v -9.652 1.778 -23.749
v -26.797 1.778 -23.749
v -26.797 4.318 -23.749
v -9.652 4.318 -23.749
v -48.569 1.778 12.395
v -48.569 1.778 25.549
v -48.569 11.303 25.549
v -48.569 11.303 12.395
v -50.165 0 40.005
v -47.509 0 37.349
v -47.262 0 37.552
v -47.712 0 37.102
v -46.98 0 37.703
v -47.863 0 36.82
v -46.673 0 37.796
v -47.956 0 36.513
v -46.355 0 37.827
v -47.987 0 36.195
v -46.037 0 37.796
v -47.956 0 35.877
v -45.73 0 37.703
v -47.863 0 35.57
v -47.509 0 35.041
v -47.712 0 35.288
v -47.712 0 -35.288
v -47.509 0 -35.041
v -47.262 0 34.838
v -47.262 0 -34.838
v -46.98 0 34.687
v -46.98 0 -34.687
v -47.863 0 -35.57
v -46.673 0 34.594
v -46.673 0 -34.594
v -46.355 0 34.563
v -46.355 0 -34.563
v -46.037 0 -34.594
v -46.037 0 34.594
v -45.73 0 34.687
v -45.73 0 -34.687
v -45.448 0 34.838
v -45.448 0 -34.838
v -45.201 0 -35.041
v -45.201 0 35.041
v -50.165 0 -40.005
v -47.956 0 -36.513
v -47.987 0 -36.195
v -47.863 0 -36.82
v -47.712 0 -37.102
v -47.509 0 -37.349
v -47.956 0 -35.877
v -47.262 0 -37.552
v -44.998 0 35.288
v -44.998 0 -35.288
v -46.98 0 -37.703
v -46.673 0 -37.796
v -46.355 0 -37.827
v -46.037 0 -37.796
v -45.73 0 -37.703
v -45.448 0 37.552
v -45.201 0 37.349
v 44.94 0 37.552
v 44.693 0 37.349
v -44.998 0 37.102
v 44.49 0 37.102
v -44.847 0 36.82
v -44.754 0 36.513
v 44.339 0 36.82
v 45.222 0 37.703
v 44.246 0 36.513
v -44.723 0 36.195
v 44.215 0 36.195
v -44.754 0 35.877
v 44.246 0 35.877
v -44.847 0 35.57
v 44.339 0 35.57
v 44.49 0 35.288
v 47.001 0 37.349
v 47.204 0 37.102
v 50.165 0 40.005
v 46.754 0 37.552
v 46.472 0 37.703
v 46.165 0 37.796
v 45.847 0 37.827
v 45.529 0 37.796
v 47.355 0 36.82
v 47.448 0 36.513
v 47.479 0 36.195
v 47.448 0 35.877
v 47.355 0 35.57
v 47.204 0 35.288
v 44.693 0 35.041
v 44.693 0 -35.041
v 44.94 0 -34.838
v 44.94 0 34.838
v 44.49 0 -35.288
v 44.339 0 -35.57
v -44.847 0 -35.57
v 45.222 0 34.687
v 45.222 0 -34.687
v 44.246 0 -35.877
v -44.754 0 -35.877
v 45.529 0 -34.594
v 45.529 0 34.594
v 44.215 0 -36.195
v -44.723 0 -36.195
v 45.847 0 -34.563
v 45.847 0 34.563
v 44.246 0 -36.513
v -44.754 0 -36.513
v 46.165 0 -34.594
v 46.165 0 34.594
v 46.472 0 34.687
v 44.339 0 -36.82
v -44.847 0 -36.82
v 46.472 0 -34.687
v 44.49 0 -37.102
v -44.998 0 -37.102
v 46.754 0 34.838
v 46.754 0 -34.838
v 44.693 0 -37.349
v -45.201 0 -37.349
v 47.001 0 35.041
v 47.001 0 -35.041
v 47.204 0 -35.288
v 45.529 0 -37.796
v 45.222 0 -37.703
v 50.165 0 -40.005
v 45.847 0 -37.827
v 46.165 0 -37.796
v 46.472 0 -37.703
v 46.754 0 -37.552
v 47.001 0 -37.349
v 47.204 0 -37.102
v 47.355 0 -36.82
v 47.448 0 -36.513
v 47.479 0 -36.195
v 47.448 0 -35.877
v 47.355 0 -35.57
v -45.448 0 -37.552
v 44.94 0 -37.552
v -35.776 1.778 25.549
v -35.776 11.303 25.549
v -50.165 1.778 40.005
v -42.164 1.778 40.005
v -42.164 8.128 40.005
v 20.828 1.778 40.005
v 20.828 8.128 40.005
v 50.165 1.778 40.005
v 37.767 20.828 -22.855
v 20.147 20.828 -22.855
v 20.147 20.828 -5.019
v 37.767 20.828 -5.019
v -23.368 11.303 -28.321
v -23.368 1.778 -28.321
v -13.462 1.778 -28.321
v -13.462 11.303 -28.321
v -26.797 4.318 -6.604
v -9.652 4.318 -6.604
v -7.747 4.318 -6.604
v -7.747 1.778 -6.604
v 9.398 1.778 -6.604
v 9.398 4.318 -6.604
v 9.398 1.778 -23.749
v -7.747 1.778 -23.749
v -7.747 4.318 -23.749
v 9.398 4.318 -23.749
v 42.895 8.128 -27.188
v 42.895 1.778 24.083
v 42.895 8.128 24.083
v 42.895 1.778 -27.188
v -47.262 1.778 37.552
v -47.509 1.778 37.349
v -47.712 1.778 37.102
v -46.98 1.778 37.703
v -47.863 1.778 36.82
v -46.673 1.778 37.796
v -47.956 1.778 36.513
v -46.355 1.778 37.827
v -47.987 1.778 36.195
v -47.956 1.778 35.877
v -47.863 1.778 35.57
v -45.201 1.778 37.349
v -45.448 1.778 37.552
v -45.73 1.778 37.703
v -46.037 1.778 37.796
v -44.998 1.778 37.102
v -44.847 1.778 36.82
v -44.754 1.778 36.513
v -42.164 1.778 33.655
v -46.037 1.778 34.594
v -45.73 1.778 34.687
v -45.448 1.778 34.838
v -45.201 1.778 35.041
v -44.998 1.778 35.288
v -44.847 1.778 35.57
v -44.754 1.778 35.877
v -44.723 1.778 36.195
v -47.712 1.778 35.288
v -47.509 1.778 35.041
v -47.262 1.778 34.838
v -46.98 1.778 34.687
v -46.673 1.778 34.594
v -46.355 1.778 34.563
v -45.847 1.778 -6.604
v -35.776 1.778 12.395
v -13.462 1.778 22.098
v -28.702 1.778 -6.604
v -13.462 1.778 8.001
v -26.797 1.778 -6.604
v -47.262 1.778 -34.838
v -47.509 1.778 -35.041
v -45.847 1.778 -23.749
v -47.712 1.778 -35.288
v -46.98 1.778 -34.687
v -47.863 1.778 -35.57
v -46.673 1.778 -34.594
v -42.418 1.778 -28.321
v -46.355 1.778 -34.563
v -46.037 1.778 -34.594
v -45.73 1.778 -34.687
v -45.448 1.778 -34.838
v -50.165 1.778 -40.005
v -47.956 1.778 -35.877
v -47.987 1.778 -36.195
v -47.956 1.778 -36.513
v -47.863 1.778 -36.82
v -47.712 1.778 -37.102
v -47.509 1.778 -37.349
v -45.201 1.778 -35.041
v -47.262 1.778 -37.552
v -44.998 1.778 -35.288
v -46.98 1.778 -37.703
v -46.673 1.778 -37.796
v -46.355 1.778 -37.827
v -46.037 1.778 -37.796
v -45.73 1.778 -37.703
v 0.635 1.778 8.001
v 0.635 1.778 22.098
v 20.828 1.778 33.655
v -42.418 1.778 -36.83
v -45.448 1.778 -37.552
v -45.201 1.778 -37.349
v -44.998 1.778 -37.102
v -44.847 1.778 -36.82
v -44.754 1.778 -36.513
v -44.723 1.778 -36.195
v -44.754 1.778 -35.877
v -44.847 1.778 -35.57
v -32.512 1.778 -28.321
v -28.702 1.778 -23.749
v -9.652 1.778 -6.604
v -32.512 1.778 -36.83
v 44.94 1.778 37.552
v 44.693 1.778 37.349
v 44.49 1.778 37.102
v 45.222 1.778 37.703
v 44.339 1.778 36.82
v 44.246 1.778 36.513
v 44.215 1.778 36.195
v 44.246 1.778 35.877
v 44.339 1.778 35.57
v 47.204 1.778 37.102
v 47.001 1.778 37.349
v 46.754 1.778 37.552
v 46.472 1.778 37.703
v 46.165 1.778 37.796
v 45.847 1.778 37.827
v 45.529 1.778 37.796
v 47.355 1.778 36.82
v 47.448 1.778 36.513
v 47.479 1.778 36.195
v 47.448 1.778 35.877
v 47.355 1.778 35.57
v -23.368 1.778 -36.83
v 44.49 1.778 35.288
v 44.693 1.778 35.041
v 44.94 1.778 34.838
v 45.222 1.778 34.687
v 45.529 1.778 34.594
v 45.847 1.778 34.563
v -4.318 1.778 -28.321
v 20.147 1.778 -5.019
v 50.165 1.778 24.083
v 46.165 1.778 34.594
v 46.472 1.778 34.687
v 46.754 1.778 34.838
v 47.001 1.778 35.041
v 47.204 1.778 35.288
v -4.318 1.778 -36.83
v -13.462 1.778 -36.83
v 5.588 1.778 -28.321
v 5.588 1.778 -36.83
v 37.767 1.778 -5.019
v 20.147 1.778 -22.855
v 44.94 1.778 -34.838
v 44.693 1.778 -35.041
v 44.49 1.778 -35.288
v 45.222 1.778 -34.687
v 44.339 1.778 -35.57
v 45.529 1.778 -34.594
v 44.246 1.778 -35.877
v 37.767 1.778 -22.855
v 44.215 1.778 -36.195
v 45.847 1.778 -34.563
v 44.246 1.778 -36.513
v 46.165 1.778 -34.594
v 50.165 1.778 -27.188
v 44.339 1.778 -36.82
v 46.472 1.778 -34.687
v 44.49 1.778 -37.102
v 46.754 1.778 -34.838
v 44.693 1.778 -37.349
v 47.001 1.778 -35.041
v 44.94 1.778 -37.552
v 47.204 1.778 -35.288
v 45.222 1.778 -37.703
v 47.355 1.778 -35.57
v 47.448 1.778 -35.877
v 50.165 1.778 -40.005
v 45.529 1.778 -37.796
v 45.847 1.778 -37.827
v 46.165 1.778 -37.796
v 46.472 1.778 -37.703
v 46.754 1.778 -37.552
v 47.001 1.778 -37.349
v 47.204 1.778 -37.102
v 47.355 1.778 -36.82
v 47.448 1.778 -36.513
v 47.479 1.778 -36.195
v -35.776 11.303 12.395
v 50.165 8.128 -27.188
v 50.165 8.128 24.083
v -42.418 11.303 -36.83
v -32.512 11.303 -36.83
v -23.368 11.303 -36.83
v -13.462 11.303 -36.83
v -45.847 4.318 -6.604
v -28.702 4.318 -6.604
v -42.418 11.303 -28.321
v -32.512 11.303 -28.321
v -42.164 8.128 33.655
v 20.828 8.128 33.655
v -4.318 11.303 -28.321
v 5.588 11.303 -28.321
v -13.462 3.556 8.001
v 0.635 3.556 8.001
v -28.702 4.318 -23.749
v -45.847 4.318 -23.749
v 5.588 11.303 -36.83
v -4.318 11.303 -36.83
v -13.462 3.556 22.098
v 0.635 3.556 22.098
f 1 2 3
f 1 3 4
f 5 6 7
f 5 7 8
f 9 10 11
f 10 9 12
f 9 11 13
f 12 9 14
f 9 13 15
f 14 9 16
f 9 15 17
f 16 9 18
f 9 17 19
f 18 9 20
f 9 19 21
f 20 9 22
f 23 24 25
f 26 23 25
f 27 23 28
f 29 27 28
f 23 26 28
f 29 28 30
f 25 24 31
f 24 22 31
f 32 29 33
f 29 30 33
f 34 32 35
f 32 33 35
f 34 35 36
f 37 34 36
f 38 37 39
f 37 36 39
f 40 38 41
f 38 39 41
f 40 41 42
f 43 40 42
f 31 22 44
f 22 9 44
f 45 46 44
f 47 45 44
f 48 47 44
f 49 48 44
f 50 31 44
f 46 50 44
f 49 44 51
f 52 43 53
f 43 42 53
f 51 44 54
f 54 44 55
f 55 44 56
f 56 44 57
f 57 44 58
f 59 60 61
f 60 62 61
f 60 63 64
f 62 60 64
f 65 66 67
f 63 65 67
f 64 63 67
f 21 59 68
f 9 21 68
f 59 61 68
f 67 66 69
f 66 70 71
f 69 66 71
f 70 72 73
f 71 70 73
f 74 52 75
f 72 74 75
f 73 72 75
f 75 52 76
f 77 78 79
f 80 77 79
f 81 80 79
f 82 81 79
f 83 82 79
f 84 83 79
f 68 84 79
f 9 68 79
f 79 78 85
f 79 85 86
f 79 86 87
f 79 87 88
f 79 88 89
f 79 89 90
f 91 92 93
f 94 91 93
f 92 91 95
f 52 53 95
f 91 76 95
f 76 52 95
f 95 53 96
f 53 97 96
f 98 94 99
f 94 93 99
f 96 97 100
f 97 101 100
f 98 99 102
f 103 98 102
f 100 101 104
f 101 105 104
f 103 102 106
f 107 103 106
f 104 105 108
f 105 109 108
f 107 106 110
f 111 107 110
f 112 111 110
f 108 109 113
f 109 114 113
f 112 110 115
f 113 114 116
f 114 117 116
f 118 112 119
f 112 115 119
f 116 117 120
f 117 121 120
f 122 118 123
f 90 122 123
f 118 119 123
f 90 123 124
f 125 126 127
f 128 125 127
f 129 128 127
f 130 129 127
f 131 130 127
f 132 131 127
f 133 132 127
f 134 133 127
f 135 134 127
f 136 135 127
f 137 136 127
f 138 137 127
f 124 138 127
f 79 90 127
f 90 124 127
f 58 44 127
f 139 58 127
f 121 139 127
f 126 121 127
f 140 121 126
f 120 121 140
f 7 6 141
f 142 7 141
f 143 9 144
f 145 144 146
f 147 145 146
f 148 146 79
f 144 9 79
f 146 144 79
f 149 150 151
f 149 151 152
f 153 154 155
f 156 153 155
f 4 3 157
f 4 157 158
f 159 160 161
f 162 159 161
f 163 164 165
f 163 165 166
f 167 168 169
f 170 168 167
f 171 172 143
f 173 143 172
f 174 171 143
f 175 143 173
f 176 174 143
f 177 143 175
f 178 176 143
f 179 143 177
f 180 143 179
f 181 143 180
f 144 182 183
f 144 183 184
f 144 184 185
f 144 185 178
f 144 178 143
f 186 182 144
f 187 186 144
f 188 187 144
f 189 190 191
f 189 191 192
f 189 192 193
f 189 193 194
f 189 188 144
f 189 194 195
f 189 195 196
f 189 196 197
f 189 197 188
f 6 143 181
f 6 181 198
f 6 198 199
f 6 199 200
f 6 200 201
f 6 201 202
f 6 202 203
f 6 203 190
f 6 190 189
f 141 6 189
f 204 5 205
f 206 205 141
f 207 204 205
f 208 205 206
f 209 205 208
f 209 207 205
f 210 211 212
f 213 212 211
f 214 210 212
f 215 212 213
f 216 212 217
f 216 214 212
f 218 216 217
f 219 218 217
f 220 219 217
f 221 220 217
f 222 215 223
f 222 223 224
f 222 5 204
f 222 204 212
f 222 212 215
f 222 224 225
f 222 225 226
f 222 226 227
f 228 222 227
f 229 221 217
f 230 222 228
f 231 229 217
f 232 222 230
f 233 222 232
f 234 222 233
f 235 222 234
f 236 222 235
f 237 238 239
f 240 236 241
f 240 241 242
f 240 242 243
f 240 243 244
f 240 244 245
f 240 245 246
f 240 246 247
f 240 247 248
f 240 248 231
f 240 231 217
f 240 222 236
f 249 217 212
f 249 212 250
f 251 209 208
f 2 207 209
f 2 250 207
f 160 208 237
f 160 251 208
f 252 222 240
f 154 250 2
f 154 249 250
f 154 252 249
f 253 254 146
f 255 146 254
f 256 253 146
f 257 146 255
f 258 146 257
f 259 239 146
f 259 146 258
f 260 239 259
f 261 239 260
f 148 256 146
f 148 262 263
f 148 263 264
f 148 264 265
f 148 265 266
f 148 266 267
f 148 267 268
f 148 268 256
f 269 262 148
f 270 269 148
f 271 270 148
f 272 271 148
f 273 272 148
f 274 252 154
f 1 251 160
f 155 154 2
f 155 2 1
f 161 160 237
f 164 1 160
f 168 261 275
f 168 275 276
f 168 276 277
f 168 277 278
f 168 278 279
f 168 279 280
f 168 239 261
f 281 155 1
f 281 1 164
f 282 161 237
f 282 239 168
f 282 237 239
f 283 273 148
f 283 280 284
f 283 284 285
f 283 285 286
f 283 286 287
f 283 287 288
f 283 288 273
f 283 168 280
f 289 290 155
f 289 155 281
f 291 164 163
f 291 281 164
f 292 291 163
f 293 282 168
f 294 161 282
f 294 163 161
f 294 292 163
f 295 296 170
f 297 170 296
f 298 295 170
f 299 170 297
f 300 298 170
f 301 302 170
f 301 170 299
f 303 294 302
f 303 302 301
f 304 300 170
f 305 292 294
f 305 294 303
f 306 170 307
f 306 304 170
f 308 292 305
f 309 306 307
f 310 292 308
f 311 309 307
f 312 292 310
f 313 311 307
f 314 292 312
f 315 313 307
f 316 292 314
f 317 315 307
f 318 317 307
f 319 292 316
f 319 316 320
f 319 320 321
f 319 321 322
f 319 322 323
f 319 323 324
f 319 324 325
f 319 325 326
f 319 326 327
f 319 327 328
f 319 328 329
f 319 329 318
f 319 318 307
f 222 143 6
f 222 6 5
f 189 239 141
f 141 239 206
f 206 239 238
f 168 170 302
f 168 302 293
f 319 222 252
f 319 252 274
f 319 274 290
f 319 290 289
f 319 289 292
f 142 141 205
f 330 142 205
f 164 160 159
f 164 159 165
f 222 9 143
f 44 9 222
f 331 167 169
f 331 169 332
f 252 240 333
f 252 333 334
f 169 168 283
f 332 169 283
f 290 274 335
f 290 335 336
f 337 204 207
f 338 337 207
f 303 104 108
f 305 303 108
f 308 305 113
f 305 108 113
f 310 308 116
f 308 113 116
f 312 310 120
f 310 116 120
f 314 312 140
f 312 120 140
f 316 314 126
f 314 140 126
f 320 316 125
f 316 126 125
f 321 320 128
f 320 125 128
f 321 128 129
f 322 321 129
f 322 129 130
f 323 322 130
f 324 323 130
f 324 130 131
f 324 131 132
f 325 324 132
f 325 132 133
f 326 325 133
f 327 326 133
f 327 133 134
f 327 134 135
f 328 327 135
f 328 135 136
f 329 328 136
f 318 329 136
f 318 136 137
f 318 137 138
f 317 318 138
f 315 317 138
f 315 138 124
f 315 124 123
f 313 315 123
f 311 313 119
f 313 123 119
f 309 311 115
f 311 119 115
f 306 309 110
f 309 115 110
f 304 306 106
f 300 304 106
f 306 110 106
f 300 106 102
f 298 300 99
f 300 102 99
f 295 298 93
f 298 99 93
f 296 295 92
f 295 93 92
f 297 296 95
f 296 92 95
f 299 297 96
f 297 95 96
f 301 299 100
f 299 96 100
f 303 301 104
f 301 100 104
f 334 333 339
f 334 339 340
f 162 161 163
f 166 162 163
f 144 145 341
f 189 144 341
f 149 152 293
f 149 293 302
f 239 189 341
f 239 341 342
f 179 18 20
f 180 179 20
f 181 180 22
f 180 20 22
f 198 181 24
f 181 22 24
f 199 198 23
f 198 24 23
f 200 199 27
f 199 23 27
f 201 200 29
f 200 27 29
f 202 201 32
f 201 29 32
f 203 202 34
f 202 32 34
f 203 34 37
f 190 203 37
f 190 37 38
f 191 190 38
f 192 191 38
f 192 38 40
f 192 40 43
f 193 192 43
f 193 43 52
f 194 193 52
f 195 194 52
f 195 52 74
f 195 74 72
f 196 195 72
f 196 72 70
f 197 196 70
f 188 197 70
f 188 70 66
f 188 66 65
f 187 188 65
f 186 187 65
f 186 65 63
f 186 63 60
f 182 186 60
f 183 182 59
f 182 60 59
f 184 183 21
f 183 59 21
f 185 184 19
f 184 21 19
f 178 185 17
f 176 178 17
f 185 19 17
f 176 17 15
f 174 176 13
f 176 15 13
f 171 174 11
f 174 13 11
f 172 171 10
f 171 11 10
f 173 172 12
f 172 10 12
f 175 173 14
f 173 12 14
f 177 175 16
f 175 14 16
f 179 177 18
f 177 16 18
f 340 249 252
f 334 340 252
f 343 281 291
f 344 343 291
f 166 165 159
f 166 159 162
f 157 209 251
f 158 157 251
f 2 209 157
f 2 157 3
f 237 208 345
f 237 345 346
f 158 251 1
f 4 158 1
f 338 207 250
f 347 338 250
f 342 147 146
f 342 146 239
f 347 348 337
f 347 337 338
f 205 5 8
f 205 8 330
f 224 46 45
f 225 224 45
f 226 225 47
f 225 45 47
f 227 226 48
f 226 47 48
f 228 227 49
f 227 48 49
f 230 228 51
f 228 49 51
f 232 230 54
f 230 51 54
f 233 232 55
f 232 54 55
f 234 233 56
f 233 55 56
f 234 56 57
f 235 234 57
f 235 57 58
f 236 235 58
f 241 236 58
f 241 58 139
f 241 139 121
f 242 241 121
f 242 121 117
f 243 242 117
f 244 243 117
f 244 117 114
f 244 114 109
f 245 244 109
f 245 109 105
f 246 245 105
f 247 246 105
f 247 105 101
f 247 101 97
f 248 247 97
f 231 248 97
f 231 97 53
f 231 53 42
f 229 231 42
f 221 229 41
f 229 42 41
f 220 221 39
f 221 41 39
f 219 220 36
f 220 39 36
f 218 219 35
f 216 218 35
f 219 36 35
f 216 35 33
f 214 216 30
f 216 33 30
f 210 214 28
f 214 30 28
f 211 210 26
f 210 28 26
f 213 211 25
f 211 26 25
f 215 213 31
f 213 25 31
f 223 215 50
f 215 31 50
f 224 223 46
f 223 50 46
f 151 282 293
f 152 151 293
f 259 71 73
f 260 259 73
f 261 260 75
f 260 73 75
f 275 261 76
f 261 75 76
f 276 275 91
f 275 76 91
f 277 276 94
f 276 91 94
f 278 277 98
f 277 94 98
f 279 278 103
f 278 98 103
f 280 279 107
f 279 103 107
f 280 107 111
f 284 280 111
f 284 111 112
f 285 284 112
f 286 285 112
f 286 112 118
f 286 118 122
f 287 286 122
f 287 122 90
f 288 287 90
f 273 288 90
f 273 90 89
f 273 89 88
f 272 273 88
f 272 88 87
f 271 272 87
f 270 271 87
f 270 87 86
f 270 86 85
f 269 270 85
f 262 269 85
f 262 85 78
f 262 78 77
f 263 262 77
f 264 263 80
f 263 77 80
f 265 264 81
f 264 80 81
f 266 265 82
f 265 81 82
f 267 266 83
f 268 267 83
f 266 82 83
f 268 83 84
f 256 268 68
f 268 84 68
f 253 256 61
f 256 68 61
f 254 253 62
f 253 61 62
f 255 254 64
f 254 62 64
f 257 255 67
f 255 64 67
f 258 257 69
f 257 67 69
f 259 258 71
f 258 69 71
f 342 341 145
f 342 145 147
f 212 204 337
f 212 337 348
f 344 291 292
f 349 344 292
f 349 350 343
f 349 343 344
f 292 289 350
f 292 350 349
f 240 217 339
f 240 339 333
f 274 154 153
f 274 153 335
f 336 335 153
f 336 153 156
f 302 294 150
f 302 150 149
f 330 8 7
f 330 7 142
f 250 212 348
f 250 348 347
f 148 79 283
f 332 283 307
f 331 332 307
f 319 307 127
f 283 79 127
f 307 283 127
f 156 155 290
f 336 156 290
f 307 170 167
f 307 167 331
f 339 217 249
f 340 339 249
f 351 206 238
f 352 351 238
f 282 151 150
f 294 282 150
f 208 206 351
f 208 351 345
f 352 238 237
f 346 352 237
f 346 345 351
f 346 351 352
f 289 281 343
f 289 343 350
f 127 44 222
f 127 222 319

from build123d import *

# Parameters (mm, degrees)
SKETCH1_W                 = 100.33
SKETCH1_H                 = 80.01
BOSS_EXTRUDE1_DEPTH       = 1.778
F_4_CLEARANCE_HOLE1_D     = 3.2639
F_4_CLEARANCE_HOLE1_DEPTH = 12.7
F_4_CLEARANCE_HOLE1_TIP   = 0.980574487
SKETCH4_W                 = 17.145
SKETCH4_H                 = 17.145
BOSS_EXTRUDE2_DEPTH       = 2.54
SKETCH6_W                 = 9.906
SKETCH6_H                 = 8.509
BOSS_EXTRUDE3_DEPTH       = 9.525
LPATTERN1_COUNT           = 3
LPATTERN1_PITCH           = 19.05
SKETCH7_W                 = 14.097
SKETCH7_H                 = 14.097
BOSS_EXTRUDE4_DEPTH       = 1.778
SKETCH8_W                 = 62.992
SKETCH8_H                 = 6.35
BOSS_EXTRUDE5_DEPTH       = 6.35
SKETCH9_W                 = 7.270390316
SKETCH9_H                 = 51.271334807
BOSS_EXTRUDE6_DEPTH       = 6.35
SKETCH10_W                = 17.620008018
SKETCH10_H                = 17.836647461
BOSS_EXTRUDE7_DEPTH       = 19.05
SKETCH11_W                = 12.792637694
SKETCH11_H                = 13.15401164
BOSS_EXTRUDE8_DEPTH       = 9.525


with BuildPart() as part:
    # Sketch1 → Boss-Extrude1 (new body)
    with BuildSketch(Plane(origin=(0, 0, 0), x_dir=(1, 0, 0), z_dir=(0, 1, 0))):
        Rectangle(SKETCH1_W, SKETCH1_H)
    extrude(amount=BOSS_EXTRUDE1_DEPTH)

    # #4 Clearance Hole1
    with Locations(Plane(origin=(0, 1.778, 0), x_dir=(1, 0, 0), z_dir=(0, 1, 0))):
        with Locations((-46.355, 36.195), (45.847, -36.195), (-46.355, -36.195), (45.847, 36.195)):
            Hole(F_4_CLEARANCE_HOLE1_D / 2, depth=F_4_CLEARANCE_HOLE1_DEPTH)
            with Locations((0, 0, -(F_4_CLEARANCE_HOLE1_DEPTH + F_4_CLEARANCE_HOLE1_TIP / 2))):  # 118° drill point
                Cone(0, F_4_CLEARANCE_HOLE1_D / 2, F_4_CLEARANCE_HOLE1_TIP, mode=Mode.SUBTRACT)

    # Sketch4 → Boss-Extrude2 (add)
    with BuildSketch(Plane(origin=(0, 1.778, 0), x_dir=(1, 0, 0), z_dir=(0, 1, 0))):
        with Locations((-37.2745, 15.1765)):
            Rectangle(SKETCH4_W, SKETCH4_H)
    boss_extrude2 = extrude(amount=BOSS_EXTRUDE2_DEPTH)

    # Sketch6 → Boss-Extrude3 (add)
    with BuildSketch(Plane(origin=(0, 1.778, 0), x_dir=(1, 0, 0), z_dir=(0, 1, 0))):
        with Locations((-37.465, 32.5755)):
            Rectangle(SKETCH6_W, SKETCH6_H)
    boss_extrude3 = extrude(amount=BOSS_EXTRUDE3_DEPTH)

    # LPattern1: Boss-Extrude2, Boss-Extrude3 ×3
    with Locations(*[(i * LPATTERN1_PITCH, 0, 0) for i in range(1, LPATTERN1_COUNT)]):
        add(boss_extrude2)
        add(boss_extrude3)

    # Sketch7 → Boss-Extrude4 (add)
    with BuildSketch(Plane(origin=(0, 1.778, 0), x_dir=(1, 0, 0), z_dir=(0, 1, 0))):
        with Locations((-6.4135, -15.0495)):
            Rectangle(SKETCH7_W, SKETCH7_H)
    extrude(amount=BOSS_EXTRUDE4_DEPTH)

    # Sketch8 → Boss-Extrude5 (add)
    with BuildSketch(Plane(origin=(0, 1.778, 0), x_dir=(1, 0, 0), z_dir=(0, 1, 0))):
        with Locations((-10.668, -36.83)):
            Rectangle(SKETCH8_W, SKETCH8_H)
    extrude(amount=BOSS_EXTRUDE5_DEPTH)

    # Sketch9 → Boss-Extrude6 (add)
    with BuildSketch(Plane(origin=(0, 1.778, 0), x_dir=(1, 0, 0), z_dir=(0, 1, 0))):
        with Locations((46.529804842, 1.552582673)):
            Rectangle(SKETCH9_W, SKETCH9_H)
    extrude(amount=BOSS_EXTRUDE6_DEPTH)

    # Sketch10 → Boss-Extrude7 (add)
    with BuildSketch(Plane(origin=(0, 1.778, 0), x_dir=(1, 0, 0), z_dir=(0, 1, 0))):
        with Locations((28.957472194, 13.93713749)):
            Rectangle(SKETCH10_W, SKETCH10_H)
    extrude(amount=BOSS_EXTRUDE7_DEPTH)

    # Sketch11 → Boss-Extrude8 (add)
    with BuildSketch(Plane(origin=(0, 1.778, 0), x_dir=(1, 0, 0), z_dir=(0, 1, 0))):
        with Locations((-42.172339514, -18.972132172)):
            Rectangle(SKETCH11_W, SKETCH11_H)
    extrude(amount=BOSS_EXTRUDE8_DEPTH)


solid = part.part
